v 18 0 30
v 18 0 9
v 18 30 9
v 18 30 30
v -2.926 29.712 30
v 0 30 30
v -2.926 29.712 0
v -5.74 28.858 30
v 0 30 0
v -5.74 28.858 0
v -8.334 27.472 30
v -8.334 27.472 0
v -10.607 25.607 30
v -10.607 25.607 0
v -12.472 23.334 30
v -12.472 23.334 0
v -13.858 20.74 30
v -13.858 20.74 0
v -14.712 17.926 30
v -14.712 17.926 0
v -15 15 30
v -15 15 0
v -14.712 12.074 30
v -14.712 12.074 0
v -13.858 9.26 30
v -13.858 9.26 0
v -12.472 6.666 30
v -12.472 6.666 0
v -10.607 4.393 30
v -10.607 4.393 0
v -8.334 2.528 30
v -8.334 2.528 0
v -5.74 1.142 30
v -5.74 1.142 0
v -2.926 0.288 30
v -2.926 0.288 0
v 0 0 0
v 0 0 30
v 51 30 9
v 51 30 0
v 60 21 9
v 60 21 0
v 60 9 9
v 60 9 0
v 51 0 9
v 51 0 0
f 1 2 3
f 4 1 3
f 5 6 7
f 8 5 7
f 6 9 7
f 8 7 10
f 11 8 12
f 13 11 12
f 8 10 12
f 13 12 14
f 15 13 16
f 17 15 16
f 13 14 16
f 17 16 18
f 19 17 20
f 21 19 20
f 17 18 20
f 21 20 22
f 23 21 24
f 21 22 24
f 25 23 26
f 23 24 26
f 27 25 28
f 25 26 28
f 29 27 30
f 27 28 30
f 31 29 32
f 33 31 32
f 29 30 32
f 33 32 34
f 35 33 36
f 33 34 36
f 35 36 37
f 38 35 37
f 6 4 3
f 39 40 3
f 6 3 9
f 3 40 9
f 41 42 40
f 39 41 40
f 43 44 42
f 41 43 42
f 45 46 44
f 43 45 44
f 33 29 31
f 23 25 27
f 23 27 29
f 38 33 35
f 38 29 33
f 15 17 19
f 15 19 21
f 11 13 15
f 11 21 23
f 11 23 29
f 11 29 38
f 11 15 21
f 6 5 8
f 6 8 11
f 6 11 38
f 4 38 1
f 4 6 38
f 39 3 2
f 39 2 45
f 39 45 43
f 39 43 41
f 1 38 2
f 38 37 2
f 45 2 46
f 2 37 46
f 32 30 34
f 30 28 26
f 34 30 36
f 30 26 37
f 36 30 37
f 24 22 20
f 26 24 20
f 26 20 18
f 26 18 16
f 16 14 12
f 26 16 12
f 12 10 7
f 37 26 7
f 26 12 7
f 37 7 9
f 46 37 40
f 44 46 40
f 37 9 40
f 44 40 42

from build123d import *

# Parameters (mm, degrees)
F1_DEPTH = 9
F4_DEPTH = 21


with BuildPart() as f1:
    # F0 (on Top) → F1 (new body)
    with BuildSketch(Plane.XY):
        with BuildLine():
            Line((51, 30), (0, 30))
            ThreePointArc((0, 30), (-15, 15), (0, 0))
            Line((0, 0), (51, 0))
            Line((51, 0), (60, 9))
            Line((60, 9), (60, 21))
            Line((60, 21), (51, 30))
        make_face()
    extrude(amount=F1_DEPTH)

    # F2 (on face) → F4 (join)
    with BuildSketch(Plane.XY.offset(9)):
        with BuildLine():
            Line((18, 30), (0, 30))
            ThreePointArc((0, 30), (-15, 15), (0, 0))
            Line((0, 0), (18, 0))
            Line((18, 0), (18, 30))
        make_face()
    extrude(amount=F4_DEPTH)


solid = f1.part
